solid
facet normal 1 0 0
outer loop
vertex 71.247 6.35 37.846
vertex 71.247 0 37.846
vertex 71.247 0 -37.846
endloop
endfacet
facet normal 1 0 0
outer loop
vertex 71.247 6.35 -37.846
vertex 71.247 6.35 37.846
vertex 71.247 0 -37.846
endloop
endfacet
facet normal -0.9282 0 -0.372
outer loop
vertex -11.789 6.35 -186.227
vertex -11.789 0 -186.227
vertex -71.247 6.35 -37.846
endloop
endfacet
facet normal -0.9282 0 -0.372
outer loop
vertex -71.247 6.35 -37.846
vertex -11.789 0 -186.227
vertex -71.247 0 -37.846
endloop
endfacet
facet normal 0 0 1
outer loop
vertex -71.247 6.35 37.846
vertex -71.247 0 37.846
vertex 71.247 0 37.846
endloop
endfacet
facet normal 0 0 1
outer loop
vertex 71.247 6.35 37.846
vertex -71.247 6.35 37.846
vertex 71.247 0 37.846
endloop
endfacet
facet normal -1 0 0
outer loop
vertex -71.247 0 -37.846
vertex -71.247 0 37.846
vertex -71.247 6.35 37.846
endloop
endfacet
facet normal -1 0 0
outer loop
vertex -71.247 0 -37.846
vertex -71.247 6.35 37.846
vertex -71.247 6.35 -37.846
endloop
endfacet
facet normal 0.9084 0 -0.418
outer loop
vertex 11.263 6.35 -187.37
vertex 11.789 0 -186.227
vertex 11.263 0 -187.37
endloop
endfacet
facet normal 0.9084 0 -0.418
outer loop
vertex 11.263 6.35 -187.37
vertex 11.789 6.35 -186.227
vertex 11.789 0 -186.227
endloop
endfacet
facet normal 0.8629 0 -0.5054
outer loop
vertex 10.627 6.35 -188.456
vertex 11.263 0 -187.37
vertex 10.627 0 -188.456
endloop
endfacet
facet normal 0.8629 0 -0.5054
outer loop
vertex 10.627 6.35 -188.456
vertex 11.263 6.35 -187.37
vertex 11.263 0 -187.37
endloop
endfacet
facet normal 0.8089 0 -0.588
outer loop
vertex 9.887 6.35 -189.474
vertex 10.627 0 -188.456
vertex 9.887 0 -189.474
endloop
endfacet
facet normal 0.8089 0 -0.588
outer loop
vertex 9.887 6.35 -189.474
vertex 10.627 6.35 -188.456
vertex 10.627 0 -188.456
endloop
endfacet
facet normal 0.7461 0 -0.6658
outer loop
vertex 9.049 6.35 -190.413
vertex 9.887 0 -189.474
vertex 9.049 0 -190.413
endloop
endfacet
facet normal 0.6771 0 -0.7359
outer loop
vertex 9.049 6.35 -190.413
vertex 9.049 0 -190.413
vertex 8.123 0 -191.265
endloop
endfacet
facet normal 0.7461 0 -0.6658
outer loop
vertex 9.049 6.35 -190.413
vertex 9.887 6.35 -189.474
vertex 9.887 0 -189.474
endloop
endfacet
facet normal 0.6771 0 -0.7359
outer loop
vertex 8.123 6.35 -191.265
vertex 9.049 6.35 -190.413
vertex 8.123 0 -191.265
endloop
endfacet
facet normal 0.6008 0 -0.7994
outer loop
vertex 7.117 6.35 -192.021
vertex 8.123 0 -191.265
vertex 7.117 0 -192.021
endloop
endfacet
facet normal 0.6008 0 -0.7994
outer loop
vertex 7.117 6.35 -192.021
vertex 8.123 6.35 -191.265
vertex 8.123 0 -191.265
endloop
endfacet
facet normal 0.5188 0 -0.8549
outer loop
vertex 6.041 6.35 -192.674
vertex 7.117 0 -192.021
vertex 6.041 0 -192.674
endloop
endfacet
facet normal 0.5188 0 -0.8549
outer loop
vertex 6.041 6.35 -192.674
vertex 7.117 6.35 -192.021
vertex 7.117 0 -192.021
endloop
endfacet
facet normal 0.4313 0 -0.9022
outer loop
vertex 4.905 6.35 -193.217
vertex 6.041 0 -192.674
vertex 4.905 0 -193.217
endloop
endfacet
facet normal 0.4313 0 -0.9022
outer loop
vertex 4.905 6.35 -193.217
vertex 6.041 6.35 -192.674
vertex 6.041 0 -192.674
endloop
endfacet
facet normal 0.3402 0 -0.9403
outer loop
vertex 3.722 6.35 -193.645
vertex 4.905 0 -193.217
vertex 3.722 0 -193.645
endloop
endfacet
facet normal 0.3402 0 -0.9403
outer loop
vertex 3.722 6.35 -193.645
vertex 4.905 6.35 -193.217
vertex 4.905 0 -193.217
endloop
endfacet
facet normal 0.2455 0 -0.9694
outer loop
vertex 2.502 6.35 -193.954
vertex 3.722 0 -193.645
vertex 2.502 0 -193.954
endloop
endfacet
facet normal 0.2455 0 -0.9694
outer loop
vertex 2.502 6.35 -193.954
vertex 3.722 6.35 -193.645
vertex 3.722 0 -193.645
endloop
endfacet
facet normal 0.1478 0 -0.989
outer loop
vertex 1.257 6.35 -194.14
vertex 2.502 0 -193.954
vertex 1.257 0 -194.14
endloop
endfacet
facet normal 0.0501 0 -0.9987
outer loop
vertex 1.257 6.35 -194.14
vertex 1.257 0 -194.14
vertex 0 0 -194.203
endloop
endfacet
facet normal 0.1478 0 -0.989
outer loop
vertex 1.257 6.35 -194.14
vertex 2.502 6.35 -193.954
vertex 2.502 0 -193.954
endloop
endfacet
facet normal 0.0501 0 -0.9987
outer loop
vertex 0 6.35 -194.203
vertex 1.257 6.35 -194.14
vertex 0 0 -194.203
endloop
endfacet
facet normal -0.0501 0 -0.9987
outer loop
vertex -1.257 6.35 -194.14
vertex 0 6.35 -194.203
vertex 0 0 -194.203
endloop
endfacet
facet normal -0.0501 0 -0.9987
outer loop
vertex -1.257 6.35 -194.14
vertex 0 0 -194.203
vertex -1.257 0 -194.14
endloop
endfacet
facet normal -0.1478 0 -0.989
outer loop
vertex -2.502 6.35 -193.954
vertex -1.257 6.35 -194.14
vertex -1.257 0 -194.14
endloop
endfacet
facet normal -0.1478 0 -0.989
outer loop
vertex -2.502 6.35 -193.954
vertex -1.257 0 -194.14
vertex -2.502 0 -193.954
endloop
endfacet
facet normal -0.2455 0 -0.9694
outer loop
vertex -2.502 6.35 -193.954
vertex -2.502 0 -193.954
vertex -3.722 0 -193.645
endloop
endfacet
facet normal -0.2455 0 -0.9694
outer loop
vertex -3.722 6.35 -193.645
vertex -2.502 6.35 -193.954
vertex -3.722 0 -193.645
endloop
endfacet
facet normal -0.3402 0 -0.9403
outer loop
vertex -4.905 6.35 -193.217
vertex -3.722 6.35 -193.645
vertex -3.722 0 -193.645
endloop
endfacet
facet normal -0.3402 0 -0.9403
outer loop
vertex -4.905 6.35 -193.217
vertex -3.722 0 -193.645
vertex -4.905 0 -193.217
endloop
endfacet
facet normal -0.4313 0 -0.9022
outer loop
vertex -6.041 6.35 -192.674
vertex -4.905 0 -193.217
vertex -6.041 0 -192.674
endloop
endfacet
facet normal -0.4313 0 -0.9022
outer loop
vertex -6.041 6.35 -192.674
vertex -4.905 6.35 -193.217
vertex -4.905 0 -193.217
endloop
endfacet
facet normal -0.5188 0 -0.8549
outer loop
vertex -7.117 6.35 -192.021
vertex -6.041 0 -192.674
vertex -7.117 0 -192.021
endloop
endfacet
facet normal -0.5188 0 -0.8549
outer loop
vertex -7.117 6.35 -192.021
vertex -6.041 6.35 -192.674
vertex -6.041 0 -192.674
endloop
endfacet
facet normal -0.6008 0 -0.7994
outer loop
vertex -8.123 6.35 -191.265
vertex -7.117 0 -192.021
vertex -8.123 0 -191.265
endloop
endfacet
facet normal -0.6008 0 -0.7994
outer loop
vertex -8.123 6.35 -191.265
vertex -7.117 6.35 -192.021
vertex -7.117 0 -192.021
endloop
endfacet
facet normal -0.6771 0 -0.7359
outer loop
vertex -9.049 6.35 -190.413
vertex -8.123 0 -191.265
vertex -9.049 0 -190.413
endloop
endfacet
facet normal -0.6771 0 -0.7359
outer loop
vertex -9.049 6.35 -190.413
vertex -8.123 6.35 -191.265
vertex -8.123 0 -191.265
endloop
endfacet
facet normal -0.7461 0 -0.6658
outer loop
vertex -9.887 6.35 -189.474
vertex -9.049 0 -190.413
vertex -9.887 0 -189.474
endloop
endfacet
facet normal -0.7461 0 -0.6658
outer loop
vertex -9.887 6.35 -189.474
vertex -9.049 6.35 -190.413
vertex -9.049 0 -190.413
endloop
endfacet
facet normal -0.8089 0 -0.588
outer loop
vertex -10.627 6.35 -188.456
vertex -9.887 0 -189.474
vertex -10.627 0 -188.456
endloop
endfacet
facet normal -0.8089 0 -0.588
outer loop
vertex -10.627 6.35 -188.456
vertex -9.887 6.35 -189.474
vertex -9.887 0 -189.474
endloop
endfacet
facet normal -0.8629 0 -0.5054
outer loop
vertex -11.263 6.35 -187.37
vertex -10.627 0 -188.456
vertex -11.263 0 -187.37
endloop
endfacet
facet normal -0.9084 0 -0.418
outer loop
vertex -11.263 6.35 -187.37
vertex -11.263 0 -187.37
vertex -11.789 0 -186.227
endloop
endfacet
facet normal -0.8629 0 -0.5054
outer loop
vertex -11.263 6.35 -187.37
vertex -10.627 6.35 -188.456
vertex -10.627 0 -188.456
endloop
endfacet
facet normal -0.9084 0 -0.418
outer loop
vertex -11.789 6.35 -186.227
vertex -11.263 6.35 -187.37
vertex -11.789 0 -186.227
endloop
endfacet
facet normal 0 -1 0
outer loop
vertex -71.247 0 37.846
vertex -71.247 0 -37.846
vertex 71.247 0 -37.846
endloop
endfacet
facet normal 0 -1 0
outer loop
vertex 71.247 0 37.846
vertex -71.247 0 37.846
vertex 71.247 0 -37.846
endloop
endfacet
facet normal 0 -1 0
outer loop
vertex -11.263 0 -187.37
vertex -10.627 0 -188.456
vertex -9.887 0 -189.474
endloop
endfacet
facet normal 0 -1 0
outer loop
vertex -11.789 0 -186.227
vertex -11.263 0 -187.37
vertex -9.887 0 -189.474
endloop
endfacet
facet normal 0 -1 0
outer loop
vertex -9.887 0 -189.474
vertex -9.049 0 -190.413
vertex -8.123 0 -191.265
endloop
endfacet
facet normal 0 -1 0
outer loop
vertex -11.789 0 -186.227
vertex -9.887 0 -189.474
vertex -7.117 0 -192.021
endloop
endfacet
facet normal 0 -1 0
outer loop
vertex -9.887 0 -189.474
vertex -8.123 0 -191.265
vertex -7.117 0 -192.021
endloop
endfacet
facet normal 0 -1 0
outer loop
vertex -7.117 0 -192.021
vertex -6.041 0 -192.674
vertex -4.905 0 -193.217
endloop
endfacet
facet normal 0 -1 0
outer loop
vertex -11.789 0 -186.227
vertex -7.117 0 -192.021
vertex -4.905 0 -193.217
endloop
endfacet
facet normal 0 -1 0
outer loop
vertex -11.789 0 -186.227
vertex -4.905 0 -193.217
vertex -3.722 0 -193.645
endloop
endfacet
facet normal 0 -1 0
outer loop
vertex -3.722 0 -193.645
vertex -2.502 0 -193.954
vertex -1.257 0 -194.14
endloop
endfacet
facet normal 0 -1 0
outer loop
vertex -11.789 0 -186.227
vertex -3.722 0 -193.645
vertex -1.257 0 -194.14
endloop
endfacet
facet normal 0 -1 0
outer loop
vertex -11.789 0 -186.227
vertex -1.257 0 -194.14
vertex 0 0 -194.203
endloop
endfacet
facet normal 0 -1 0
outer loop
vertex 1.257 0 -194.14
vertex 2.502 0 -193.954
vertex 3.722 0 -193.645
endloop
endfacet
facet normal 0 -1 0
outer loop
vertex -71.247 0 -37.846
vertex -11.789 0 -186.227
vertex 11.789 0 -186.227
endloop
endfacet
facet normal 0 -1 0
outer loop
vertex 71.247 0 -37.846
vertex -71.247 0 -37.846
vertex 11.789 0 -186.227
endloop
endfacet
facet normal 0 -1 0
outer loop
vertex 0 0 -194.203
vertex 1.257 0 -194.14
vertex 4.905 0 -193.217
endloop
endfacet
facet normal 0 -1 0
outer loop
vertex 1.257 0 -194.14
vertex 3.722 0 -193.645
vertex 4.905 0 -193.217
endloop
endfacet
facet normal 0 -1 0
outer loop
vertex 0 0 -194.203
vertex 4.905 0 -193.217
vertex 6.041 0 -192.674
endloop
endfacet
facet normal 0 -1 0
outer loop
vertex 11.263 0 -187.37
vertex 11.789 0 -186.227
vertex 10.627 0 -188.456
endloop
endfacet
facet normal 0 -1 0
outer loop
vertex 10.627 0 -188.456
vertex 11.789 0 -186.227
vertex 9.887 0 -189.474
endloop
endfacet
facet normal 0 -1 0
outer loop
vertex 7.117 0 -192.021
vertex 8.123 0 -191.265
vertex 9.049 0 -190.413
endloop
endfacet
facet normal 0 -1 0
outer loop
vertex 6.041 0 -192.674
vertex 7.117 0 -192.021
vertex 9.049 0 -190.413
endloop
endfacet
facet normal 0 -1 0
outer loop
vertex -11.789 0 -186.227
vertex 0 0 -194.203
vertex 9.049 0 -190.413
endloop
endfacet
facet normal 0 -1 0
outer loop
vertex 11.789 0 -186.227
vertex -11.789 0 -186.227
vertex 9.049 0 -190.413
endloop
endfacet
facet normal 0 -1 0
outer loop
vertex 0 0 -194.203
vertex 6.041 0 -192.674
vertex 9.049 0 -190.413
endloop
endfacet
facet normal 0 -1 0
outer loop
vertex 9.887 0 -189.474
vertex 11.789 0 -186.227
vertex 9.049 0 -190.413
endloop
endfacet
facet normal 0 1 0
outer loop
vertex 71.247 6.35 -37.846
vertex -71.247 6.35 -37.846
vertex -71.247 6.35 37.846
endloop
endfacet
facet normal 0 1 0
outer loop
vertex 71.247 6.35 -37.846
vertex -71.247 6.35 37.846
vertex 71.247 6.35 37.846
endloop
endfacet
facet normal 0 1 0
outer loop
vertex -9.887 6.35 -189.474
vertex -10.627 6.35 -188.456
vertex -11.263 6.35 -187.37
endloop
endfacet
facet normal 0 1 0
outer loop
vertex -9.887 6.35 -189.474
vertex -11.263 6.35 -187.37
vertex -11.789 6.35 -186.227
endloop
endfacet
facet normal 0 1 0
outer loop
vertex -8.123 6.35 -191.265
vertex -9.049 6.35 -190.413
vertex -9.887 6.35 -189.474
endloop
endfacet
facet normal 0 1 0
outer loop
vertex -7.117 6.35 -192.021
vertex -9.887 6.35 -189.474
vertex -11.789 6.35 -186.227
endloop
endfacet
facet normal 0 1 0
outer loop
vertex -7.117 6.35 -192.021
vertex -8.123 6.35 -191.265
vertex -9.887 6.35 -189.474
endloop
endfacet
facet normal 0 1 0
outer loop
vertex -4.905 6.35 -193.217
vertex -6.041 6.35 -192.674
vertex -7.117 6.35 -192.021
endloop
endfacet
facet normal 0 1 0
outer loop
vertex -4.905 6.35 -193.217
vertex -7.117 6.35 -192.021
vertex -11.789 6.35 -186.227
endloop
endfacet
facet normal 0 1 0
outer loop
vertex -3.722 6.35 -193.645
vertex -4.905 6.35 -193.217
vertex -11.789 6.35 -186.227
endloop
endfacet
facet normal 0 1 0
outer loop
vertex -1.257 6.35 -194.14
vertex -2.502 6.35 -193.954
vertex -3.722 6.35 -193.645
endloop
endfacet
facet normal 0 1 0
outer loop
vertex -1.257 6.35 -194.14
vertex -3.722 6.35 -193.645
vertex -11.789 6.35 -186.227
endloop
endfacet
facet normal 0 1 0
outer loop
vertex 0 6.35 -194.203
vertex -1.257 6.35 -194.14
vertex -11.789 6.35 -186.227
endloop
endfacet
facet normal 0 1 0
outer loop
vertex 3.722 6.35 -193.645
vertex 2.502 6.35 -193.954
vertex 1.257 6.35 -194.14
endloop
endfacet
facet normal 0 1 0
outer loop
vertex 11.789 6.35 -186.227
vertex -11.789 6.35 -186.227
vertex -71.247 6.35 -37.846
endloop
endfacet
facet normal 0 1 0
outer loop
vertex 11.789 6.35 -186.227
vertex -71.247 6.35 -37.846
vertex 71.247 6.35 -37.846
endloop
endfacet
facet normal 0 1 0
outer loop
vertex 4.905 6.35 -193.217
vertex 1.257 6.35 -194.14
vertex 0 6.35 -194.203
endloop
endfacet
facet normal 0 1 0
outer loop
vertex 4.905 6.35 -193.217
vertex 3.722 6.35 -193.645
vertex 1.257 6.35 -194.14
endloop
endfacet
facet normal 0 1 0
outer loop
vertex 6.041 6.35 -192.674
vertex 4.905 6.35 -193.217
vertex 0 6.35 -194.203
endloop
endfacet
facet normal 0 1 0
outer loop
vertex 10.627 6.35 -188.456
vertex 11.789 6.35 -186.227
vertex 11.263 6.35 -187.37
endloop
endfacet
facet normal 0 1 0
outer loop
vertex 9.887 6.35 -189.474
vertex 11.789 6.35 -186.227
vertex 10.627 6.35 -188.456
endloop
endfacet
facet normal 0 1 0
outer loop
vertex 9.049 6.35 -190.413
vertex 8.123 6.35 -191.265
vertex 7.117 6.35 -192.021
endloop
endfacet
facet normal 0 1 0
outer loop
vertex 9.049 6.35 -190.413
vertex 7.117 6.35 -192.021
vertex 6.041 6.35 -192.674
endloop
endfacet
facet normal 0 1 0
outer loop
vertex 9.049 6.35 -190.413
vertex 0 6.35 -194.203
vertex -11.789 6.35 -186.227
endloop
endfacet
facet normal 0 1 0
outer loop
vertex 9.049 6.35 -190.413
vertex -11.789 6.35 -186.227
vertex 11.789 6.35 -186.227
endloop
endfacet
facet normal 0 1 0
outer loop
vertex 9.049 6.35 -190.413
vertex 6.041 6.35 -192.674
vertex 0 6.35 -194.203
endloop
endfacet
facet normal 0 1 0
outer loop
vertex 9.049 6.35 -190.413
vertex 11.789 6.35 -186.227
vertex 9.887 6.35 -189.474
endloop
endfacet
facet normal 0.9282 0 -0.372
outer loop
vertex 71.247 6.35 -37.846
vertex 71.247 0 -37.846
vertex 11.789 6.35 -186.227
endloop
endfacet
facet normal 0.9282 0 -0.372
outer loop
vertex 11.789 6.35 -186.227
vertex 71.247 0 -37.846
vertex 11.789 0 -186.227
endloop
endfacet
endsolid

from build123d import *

# Parameters (mm, degrees)
SKETCH1_W           = 142.494
SKETCH1_H           = 75.692
BOSS_EXTRUDE2_DEPTH = 6.35
FILLET4_R           = 12.7


with BuildPart() as part:
    # Sketch1 → Boss-Extrude2 (new body)
    with BuildSketch(Plane(origin=(0, 0, 0), x_dir=(1, 0, 0), z_dir=(0, 1, 0))):
        Polygon((-71.247, 37.846), (0, 37.846), (0, 215.646), align=None)
        Polygon((0, 215.646), (0, 37.846), (71.247, 37.846), align=None)
        Rectangle(SKETCH1_W, SKETCH1_H)
    extrude(amount=BOSS_EXTRUDE2_DEPTH)

    # Fillet4
    fillet4_edges = [part.edges().sort_by_distance(p)[0] for p in [
        (0, 3.175, -215.646),
    ]]
    fillet(fillet4_edges, radius=FILLET4_R)


solid = part.part
